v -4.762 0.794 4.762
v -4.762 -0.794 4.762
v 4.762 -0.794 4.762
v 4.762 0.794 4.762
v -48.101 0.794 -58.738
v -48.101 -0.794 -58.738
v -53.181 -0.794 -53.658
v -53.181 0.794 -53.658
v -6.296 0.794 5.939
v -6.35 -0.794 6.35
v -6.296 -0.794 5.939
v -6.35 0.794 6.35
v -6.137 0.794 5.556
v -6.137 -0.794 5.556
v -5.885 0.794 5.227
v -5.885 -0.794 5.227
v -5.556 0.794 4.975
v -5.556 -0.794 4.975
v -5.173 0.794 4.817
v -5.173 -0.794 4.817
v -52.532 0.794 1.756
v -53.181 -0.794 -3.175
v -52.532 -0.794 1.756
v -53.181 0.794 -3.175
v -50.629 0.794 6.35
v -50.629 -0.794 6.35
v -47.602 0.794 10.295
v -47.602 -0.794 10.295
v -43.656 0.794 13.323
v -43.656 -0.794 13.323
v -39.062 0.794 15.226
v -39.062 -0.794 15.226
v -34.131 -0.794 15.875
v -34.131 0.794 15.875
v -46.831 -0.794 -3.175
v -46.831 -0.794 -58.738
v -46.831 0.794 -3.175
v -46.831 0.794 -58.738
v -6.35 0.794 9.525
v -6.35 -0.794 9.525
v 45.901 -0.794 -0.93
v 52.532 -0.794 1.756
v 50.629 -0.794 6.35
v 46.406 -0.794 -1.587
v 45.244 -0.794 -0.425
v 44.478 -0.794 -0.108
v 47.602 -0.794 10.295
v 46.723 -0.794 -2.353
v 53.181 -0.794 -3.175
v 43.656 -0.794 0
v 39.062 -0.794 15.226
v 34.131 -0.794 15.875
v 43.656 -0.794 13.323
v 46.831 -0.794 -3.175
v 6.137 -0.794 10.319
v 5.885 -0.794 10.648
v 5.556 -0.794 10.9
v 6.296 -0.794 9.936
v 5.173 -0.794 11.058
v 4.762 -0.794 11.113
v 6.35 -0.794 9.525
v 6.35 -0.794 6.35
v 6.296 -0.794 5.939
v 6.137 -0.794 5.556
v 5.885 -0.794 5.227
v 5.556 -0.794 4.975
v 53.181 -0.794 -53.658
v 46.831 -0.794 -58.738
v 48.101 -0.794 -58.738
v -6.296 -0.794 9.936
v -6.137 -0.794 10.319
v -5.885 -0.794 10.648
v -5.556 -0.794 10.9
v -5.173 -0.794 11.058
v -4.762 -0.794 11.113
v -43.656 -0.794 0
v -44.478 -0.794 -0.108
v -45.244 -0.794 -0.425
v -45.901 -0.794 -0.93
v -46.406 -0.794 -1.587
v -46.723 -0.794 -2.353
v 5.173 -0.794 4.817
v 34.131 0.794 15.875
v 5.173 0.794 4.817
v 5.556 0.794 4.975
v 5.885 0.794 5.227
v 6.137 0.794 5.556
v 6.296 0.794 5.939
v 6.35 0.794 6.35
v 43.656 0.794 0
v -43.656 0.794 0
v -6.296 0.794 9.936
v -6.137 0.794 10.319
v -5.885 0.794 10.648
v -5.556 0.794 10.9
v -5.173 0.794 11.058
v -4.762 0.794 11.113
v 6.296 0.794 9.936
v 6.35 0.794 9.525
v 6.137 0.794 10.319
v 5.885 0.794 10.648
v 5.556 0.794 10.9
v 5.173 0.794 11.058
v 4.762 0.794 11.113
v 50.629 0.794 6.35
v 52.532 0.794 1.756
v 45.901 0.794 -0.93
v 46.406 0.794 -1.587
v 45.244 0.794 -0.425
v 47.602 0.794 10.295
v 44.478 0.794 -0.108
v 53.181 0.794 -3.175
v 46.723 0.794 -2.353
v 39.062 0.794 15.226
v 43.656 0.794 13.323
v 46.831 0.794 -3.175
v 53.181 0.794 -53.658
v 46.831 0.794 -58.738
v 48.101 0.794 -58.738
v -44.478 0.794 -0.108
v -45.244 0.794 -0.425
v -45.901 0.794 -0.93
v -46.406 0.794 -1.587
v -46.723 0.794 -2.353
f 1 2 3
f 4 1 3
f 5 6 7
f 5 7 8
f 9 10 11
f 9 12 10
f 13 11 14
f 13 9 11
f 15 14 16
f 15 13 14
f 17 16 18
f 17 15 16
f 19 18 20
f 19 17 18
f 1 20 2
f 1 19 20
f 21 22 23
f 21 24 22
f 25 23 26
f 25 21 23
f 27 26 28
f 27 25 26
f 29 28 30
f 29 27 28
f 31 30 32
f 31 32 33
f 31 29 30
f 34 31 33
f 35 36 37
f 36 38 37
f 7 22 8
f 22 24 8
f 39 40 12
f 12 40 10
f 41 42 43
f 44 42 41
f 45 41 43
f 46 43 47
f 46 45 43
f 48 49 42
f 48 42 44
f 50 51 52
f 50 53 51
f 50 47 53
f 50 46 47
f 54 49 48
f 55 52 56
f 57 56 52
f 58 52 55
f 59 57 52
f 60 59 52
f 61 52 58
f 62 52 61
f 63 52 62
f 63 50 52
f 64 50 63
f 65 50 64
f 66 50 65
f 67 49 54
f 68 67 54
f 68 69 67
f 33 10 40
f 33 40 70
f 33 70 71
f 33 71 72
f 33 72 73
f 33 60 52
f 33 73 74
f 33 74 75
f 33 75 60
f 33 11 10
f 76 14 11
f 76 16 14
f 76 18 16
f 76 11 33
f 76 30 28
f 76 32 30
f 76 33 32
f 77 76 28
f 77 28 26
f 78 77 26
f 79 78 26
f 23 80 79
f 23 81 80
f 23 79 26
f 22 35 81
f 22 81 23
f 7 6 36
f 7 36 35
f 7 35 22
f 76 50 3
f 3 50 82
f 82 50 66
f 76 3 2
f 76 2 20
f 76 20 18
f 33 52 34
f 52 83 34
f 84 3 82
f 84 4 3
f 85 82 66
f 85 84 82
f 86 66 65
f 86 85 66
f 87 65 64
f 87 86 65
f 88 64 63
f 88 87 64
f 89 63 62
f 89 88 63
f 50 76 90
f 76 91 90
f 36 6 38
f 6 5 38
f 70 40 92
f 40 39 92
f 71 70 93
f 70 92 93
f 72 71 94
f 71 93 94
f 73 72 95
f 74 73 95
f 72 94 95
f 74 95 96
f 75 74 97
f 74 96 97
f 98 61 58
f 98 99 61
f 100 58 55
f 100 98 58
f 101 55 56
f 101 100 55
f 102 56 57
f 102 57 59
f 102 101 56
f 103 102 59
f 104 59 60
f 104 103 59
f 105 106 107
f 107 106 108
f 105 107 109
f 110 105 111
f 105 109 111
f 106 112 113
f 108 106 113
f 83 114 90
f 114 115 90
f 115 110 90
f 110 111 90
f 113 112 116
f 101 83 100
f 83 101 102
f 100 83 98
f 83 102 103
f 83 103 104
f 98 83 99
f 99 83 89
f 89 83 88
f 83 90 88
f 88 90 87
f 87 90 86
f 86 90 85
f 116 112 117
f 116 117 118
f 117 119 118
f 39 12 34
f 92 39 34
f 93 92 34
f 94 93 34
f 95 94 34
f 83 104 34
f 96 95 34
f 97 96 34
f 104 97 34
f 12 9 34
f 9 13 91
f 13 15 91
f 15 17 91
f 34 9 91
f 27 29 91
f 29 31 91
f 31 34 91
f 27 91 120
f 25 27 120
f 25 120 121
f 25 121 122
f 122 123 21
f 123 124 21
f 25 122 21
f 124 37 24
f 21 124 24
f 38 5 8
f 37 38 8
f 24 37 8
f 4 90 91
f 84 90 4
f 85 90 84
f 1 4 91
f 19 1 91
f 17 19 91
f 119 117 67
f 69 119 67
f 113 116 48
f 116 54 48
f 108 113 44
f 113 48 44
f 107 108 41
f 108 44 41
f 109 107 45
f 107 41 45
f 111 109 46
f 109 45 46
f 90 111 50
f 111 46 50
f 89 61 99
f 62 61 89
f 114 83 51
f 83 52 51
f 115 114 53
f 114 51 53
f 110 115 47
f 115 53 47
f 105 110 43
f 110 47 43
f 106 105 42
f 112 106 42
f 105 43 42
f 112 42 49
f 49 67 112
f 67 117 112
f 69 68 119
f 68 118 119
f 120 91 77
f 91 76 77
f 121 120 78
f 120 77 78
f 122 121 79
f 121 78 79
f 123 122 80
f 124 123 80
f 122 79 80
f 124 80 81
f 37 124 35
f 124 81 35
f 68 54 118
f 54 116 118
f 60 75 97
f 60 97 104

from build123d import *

# Parameters (mm, degrees)
BOSS_EXTRUDE1_DEPTH     = 0.79375
FILLET1_R               = 19.05
CUT_EXTRUDE1_DEPTH      = 80.251873253
CUT_EXTRUDE1_DEPTH_BACK = 80.251873253
SKETCH2_W               = 12.7
SKETCH2_H               = 6.35
FILLET2_R               = 1.5875
CHAMFER1_SIZE           = 5.08
FILLET3_R               = 3.175


with BuildPart() as part:
    # Sketch1 → Boss-Extrude1 (new, symmetric)
    with BuildSketch(Plane(origin=(0, 0, 0), x_dir=(1, 0, 0), z_dir=(0, 1, 0))):
        Polygon((-46.83125, 58.7375), (-46.83125, 0), (46.83125, 0), (46.83125, 58.7375), (53.18125, 58.7375), (53.18125, -15.875), (-53.18125, -15.875), (-53.18125, 58.7375), align=None)
    extrude(amount=BOSS_EXTRUDE1_DEPTH, both=True)

    # Fillet1
    fillet1_edges = [part.edges().sort_by_distance(p)[0] for p in [
        (53.18125, 0, 15.875),
        (-53.18125, 0, 15.875),
    ]]
    fillet(fillet1_edges, radius=FILLET1_R)

    # Sketch2 → Cut-Extrude1 (cut, two sides: drawn at the far end of the back side and taken through both)
    with BuildSketch(Plane(origin=(0, 0.79375, 0), x_dir=(1, 0, 0), z_dir=(0, 1, 0)).offset(-CUT_EXTRUDE1_DEPTH_BACK)):
        with Locations((0, -7.9375)):
            Rectangle(SKETCH2_W, SKETCH2_H)
    extrude(amount=CUT_EXTRUDE1_DEPTH + CUT_EXTRUDE1_DEPTH_BACK, mode=Mode.SUBTRACT)

    # Fillet2
    fillet2_edges = [part.edges().sort_by_distance(p)[0] for p in [
        (6.35, 0, 4.7625),
        (6.35, 0, 11.1125),
        (-6.35, 0, 11.1125),
        (-6.35, 0, 4.7625),
    ]]
    fillet(fillet2_edges, radius=FILLET2_R)

    # Chamfer1
    chamfer1_edges = [part.edges().sort_by_distance(p)[0] for p in [
        (-53.18125, 0, -58.7375),
        (53.18125, 0, -58.7375),
    ]]
    chamfer(chamfer1_edges, length=CHAMFER1_SIZE)

    # Fillet3
    fillet3_edges = [part.edges().sort_by_distance(p)[0] for p in [
        (-46.83125, 0, 0),
        (46.83125, 0, 0),
    ]]
    fillet(fillet3_edges, radius=FILLET3_R)


solid = part.part
